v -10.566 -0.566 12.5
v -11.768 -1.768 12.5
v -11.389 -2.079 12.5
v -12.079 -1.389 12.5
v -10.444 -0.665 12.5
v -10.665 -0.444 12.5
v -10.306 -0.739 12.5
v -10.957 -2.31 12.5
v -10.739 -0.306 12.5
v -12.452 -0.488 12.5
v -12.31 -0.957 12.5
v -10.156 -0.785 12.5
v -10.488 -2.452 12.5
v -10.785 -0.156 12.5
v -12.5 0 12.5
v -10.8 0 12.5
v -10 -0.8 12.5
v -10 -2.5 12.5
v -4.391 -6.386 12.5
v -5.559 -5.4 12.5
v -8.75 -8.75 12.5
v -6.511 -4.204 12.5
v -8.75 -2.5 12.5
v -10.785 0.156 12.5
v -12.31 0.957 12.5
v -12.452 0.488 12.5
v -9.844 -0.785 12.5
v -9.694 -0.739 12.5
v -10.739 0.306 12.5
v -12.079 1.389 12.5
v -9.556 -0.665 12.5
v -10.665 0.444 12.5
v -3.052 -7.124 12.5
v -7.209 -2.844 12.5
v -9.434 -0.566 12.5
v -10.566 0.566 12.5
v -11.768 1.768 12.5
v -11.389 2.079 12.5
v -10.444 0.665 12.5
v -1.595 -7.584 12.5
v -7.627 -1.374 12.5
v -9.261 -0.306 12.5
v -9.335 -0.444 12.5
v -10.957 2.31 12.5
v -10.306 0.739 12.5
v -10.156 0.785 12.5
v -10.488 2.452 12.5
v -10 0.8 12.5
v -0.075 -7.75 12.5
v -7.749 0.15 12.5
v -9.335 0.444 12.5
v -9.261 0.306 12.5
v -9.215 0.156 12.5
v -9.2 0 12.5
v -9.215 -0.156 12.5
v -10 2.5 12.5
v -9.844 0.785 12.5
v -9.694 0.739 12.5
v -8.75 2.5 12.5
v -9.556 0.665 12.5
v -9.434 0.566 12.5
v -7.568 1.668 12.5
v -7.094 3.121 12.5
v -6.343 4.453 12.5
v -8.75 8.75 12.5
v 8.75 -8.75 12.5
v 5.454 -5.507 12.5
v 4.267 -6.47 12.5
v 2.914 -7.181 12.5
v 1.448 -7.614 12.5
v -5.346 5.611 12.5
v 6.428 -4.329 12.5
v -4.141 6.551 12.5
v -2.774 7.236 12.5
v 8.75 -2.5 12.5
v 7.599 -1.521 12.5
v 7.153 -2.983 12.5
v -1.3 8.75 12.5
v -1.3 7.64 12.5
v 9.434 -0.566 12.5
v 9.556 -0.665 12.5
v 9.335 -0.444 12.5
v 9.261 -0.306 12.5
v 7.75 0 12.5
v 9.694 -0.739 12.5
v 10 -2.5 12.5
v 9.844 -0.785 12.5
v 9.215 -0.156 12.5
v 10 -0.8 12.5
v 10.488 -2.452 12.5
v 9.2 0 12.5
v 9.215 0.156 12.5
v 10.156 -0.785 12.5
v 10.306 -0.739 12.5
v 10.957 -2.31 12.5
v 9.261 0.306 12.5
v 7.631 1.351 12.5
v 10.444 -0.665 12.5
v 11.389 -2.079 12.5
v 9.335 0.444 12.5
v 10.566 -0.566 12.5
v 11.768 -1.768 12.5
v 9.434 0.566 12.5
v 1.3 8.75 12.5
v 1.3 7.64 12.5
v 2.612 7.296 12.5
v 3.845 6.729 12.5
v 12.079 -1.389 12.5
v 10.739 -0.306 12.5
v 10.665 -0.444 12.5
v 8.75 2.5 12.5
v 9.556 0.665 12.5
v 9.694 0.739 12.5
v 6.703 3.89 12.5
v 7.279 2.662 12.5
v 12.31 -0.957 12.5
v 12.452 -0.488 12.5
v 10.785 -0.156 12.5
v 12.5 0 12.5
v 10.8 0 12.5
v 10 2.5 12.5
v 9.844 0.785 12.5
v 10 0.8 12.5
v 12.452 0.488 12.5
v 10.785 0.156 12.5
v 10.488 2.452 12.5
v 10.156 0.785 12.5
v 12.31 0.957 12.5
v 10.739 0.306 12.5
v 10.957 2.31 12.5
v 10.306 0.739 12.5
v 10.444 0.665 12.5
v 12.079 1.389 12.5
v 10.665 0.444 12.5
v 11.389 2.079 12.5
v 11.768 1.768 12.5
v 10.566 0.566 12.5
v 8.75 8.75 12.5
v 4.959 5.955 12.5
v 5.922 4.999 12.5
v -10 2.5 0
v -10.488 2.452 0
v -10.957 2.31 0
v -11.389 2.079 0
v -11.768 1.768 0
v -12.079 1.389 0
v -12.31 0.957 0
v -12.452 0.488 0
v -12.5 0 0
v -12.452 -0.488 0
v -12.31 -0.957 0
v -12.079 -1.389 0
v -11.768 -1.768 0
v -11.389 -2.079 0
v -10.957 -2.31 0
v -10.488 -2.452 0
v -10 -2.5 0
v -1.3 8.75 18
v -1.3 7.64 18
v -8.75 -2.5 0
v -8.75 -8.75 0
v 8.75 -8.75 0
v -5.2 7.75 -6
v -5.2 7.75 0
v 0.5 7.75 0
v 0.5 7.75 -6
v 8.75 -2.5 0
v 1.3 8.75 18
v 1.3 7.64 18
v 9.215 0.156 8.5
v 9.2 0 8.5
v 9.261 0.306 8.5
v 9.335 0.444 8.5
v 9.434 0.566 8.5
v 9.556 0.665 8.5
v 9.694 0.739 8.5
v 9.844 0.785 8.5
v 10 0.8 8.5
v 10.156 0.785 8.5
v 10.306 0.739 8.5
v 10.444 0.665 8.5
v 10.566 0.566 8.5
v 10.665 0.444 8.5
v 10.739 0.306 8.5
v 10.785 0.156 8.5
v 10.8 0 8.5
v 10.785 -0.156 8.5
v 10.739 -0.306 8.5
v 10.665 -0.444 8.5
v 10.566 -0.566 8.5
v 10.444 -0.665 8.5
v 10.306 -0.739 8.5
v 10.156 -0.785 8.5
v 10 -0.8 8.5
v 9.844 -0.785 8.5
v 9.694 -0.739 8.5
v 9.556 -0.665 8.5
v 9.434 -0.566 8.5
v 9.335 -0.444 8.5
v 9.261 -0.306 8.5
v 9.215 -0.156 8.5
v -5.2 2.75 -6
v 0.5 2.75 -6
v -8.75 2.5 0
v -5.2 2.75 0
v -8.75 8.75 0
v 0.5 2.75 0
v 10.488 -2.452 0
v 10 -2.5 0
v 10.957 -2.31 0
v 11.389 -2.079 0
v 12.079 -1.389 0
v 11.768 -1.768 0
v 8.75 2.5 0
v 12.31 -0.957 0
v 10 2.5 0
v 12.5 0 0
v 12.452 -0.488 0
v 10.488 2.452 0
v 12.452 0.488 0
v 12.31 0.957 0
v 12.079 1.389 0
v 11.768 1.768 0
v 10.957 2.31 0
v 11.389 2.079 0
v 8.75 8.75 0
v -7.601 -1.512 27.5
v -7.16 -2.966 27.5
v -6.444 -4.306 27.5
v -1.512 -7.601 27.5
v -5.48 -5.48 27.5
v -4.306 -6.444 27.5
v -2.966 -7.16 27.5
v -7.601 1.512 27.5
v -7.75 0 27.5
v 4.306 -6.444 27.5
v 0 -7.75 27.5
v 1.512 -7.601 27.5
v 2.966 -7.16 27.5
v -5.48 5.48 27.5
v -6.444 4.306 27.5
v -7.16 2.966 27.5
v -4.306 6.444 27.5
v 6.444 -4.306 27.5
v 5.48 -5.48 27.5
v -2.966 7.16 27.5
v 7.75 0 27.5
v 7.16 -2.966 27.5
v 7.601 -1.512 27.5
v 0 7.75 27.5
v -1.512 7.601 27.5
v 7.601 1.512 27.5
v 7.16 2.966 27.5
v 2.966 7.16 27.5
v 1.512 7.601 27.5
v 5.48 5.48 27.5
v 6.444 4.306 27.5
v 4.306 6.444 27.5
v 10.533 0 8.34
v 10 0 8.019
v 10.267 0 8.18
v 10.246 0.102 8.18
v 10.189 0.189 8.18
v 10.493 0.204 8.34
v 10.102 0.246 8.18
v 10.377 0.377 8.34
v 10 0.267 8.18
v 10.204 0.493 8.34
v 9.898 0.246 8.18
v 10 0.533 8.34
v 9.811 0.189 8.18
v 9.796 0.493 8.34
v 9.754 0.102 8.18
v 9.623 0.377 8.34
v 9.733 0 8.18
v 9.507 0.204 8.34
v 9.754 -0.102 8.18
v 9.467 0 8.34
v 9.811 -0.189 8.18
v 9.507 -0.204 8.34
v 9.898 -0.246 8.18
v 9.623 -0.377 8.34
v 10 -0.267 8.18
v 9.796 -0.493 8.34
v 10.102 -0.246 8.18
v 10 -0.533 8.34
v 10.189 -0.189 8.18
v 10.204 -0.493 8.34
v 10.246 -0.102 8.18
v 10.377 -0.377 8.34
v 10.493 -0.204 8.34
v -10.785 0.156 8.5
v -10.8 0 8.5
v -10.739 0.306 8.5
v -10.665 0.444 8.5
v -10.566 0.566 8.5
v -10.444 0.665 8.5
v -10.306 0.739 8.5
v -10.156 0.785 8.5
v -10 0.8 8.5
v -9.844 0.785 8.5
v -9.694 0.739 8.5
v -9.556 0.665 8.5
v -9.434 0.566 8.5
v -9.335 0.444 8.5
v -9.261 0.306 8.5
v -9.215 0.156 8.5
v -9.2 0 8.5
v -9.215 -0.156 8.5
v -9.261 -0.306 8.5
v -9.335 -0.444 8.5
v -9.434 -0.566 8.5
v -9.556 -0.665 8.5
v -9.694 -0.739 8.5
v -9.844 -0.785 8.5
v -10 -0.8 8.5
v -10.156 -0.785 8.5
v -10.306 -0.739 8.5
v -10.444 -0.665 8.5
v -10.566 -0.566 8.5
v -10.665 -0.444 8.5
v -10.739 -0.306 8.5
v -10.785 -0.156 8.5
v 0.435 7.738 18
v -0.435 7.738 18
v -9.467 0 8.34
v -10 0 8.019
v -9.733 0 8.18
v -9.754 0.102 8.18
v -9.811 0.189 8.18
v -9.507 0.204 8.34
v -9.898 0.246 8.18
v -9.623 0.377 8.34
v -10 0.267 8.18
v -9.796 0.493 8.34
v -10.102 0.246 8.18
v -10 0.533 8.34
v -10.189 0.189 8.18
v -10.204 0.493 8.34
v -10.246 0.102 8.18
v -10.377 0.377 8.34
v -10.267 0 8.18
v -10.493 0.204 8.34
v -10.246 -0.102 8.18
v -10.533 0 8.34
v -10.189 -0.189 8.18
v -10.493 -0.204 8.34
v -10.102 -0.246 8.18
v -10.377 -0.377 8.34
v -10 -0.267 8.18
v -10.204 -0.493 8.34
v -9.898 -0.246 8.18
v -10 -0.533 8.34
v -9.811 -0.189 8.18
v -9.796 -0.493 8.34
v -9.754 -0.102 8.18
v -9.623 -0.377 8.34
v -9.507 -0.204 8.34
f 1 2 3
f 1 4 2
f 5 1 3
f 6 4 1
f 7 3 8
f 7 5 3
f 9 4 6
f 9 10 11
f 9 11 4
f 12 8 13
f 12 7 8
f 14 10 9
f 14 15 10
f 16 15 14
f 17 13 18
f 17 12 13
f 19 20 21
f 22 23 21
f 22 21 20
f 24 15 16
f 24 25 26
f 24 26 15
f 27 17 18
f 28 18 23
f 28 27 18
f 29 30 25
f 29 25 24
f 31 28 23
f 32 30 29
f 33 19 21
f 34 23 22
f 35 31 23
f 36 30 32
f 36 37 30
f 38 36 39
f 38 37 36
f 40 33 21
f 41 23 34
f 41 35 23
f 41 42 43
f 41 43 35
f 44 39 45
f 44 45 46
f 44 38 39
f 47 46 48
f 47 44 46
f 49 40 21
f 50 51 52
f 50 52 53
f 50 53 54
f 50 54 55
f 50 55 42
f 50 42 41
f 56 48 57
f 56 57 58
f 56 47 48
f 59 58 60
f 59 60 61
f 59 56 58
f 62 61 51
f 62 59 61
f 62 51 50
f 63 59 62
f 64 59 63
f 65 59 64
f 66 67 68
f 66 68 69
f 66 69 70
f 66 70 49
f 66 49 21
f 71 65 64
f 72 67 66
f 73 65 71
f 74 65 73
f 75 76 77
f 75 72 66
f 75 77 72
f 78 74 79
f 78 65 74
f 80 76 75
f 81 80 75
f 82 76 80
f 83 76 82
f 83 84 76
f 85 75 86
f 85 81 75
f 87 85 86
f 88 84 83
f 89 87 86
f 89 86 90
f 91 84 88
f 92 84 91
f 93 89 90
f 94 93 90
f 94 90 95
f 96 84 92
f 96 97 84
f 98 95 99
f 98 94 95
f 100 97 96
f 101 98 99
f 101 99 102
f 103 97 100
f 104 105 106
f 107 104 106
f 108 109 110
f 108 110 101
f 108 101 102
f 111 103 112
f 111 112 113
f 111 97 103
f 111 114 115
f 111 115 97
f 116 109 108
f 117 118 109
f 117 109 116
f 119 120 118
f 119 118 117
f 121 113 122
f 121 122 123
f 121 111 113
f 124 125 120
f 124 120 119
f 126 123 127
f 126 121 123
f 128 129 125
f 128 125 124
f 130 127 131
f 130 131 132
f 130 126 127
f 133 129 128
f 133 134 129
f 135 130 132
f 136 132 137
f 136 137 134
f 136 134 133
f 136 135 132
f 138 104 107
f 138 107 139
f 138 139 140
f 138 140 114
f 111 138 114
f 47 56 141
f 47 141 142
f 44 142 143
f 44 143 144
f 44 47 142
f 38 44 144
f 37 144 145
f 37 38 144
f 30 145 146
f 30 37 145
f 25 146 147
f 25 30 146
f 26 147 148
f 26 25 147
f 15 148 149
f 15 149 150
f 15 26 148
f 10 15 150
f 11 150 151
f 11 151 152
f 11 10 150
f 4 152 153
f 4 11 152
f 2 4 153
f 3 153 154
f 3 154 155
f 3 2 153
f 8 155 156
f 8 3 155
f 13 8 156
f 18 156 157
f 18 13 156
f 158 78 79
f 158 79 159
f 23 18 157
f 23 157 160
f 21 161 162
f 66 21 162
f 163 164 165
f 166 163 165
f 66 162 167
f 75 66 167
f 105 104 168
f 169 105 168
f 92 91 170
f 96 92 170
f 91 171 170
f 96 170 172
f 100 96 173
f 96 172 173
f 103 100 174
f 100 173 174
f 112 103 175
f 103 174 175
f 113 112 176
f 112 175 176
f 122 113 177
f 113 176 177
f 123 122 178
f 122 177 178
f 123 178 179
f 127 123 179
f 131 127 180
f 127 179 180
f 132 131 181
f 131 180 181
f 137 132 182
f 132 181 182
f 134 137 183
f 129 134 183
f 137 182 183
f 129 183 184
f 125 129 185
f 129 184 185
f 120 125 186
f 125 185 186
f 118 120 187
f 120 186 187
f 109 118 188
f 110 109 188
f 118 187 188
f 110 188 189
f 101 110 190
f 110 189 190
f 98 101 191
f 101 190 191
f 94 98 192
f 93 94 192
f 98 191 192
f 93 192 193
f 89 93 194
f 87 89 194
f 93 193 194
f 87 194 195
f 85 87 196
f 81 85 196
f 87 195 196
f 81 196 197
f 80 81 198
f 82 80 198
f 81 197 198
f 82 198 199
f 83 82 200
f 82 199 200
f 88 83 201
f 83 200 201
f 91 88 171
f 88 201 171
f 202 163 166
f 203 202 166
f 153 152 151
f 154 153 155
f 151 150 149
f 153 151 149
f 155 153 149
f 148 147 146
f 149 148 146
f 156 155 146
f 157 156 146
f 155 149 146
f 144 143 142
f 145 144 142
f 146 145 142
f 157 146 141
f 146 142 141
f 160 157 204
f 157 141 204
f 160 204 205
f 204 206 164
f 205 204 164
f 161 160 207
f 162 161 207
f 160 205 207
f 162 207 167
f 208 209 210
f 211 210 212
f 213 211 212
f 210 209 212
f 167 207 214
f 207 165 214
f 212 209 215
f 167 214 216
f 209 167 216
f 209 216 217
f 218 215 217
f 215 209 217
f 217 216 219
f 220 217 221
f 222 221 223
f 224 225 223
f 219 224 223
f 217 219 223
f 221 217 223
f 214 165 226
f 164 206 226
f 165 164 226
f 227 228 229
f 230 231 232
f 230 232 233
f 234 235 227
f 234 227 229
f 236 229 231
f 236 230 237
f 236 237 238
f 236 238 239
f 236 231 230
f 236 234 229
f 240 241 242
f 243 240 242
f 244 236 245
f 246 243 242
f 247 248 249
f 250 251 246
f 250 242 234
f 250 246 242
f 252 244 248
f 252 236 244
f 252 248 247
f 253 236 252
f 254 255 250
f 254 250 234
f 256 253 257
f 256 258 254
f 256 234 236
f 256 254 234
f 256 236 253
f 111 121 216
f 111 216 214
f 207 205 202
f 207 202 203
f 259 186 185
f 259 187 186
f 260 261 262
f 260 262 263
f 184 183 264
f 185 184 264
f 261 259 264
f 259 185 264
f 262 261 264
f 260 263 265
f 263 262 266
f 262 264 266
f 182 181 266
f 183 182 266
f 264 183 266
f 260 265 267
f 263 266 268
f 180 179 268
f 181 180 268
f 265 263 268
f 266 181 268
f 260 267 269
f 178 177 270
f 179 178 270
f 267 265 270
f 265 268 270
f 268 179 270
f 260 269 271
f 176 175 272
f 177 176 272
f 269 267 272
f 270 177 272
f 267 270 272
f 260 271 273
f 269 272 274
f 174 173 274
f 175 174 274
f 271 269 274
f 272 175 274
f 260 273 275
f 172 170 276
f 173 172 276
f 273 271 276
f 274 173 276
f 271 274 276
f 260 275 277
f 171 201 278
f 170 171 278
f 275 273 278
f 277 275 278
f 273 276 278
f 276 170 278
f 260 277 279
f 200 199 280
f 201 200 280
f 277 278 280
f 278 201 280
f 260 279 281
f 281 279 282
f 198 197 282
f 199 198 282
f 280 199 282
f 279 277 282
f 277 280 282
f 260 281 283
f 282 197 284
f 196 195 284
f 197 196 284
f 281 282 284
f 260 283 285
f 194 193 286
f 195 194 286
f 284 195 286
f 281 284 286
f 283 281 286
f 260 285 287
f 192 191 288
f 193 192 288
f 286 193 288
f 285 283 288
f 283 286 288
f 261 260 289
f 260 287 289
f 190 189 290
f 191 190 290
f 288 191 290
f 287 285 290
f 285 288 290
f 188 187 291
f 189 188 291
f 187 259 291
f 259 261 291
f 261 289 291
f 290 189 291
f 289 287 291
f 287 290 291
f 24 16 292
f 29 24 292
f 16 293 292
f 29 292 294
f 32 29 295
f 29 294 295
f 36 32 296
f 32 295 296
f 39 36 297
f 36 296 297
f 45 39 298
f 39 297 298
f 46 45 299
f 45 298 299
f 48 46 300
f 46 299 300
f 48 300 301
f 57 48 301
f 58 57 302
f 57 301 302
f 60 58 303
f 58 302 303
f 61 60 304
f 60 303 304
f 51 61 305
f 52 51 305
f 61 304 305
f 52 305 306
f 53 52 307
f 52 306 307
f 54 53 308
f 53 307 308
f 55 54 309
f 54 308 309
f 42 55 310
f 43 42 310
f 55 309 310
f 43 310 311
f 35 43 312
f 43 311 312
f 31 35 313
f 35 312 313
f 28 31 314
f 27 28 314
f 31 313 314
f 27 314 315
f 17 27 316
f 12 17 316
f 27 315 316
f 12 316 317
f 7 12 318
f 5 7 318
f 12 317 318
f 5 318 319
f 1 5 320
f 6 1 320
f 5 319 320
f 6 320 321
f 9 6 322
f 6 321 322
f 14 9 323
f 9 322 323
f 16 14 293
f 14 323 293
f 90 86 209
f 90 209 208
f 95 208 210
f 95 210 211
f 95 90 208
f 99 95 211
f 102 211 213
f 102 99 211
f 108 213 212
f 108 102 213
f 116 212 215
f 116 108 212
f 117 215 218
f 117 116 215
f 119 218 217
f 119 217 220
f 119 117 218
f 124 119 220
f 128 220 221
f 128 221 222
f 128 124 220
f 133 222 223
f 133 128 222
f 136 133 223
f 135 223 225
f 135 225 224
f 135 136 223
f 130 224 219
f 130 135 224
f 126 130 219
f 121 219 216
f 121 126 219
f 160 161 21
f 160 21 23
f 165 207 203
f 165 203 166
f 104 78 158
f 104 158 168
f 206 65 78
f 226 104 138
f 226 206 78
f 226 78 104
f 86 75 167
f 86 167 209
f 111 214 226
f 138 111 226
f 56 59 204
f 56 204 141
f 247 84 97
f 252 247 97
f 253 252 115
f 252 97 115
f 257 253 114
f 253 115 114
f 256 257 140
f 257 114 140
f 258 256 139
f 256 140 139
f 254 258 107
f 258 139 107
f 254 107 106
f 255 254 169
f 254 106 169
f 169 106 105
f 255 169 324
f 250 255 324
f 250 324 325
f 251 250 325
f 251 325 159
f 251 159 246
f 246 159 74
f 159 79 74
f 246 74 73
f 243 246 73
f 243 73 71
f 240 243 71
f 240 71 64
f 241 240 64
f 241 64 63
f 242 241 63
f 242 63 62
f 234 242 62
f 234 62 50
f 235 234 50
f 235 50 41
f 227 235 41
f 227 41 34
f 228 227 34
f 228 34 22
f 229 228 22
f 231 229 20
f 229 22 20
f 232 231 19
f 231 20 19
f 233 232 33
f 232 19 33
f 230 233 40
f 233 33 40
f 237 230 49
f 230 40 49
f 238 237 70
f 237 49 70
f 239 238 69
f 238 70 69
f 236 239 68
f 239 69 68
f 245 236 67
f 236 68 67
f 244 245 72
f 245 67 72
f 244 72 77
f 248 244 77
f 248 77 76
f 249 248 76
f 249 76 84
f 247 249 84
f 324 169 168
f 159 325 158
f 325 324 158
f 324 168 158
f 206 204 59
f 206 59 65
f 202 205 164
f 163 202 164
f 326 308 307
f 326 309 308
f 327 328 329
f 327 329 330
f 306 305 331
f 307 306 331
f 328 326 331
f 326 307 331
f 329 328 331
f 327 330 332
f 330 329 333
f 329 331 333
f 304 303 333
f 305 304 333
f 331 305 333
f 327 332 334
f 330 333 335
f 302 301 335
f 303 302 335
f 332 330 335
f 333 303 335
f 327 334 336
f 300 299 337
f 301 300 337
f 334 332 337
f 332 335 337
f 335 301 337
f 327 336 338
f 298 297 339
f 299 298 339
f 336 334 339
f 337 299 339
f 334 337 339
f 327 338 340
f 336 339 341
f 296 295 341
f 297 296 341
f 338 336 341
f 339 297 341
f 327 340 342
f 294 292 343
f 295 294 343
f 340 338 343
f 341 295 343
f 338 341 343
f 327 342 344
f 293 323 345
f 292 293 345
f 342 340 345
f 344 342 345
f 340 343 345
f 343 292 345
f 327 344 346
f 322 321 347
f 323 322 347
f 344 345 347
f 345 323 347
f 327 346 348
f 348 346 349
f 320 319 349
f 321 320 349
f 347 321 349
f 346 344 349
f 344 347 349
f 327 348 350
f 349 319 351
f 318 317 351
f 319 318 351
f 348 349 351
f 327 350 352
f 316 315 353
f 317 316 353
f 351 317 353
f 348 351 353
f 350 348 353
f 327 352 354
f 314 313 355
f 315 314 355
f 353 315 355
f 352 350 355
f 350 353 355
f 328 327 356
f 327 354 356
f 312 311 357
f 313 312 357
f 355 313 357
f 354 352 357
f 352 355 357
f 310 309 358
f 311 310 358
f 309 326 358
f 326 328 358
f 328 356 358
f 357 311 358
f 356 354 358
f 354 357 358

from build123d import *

# Parameters (mm, degrees)
F0_W     = 17.5
F0_H     = 17.5
F1_DEPTH = 12.5
F2_R     = 7.75
F3_DEPTH = 15
F5_DEPTH = 12.5
F6_D     = 1.6
F6_DEPTH = 4
F6_TIP   = 0.4806884952
F7_W     = 5.7
F7_H     = 5
F8_DEPTH = 6
F9_W     = 2.6
F9_H     = 5.5


with BuildPart() as f1:
    # F0 (on Top) → F1 (new body)
    with BuildSketch(Plane.XY):
        Rectangle(F0_W, F0_H)
    extrude(amount=F1_DEPTH)

    # F2 (on face) → F3 (join)
    with BuildSketch(Plane.XY.offset(12.5)):
        Circle(F2_R)
    extrude(amount=F3_DEPTH)

    # F4 (on face) → F5 (join, through all)
    with BuildSketch(Plane.XY.offset(12.5)):
        with BuildLine():
            Line((10, 2.5), (-10, 2.5))
            ThreePointArc((-10, 2.5), (-12.5, 0), (-10, -2.5))
            Line((-10, -2.5), (10, -2.5))
            ThreePointArc((10, -2.5), (12.5, 0), (10, 2.5))
        make_face()
    extrude(amount=-F5_DEPTH)

    # F6
    with Locations(Plane.XY.offset(12.5)):
        with Locations((-10, 0), (10, 0)):
            Hole(F6_D / 2, depth=F6_DEPTH)
            with Locations((0, 0, -(F6_DEPTH + F6_TIP / 2))):  # 118° drill point
                Cone(0, F6_D / 2, F6_TIP, mode=Mode.SUBTRACT)

    # F7 (on Top) → F8 (join)
    with BuildSketch(Plane.XY):
        with Locations((-2.35, 5.25)):
            Rectangle(F7_W, F7_H)
    extrude(amount=-F8_DEPTH)

    # F9 (on face) → F10 (join, up to the next surface of F1)
    with BuildSketch(Plane(origin=(0, 8.75, 0), x_dir=(-1, 0, 0), z_dir=(0, 1, 0))):
        with Locations((0, 15.25)):
            Rectangle(F9_W, F9_H)
    extrude(until=Until.NEXT, dir=(0, -1, 0))


solid = f1.part
